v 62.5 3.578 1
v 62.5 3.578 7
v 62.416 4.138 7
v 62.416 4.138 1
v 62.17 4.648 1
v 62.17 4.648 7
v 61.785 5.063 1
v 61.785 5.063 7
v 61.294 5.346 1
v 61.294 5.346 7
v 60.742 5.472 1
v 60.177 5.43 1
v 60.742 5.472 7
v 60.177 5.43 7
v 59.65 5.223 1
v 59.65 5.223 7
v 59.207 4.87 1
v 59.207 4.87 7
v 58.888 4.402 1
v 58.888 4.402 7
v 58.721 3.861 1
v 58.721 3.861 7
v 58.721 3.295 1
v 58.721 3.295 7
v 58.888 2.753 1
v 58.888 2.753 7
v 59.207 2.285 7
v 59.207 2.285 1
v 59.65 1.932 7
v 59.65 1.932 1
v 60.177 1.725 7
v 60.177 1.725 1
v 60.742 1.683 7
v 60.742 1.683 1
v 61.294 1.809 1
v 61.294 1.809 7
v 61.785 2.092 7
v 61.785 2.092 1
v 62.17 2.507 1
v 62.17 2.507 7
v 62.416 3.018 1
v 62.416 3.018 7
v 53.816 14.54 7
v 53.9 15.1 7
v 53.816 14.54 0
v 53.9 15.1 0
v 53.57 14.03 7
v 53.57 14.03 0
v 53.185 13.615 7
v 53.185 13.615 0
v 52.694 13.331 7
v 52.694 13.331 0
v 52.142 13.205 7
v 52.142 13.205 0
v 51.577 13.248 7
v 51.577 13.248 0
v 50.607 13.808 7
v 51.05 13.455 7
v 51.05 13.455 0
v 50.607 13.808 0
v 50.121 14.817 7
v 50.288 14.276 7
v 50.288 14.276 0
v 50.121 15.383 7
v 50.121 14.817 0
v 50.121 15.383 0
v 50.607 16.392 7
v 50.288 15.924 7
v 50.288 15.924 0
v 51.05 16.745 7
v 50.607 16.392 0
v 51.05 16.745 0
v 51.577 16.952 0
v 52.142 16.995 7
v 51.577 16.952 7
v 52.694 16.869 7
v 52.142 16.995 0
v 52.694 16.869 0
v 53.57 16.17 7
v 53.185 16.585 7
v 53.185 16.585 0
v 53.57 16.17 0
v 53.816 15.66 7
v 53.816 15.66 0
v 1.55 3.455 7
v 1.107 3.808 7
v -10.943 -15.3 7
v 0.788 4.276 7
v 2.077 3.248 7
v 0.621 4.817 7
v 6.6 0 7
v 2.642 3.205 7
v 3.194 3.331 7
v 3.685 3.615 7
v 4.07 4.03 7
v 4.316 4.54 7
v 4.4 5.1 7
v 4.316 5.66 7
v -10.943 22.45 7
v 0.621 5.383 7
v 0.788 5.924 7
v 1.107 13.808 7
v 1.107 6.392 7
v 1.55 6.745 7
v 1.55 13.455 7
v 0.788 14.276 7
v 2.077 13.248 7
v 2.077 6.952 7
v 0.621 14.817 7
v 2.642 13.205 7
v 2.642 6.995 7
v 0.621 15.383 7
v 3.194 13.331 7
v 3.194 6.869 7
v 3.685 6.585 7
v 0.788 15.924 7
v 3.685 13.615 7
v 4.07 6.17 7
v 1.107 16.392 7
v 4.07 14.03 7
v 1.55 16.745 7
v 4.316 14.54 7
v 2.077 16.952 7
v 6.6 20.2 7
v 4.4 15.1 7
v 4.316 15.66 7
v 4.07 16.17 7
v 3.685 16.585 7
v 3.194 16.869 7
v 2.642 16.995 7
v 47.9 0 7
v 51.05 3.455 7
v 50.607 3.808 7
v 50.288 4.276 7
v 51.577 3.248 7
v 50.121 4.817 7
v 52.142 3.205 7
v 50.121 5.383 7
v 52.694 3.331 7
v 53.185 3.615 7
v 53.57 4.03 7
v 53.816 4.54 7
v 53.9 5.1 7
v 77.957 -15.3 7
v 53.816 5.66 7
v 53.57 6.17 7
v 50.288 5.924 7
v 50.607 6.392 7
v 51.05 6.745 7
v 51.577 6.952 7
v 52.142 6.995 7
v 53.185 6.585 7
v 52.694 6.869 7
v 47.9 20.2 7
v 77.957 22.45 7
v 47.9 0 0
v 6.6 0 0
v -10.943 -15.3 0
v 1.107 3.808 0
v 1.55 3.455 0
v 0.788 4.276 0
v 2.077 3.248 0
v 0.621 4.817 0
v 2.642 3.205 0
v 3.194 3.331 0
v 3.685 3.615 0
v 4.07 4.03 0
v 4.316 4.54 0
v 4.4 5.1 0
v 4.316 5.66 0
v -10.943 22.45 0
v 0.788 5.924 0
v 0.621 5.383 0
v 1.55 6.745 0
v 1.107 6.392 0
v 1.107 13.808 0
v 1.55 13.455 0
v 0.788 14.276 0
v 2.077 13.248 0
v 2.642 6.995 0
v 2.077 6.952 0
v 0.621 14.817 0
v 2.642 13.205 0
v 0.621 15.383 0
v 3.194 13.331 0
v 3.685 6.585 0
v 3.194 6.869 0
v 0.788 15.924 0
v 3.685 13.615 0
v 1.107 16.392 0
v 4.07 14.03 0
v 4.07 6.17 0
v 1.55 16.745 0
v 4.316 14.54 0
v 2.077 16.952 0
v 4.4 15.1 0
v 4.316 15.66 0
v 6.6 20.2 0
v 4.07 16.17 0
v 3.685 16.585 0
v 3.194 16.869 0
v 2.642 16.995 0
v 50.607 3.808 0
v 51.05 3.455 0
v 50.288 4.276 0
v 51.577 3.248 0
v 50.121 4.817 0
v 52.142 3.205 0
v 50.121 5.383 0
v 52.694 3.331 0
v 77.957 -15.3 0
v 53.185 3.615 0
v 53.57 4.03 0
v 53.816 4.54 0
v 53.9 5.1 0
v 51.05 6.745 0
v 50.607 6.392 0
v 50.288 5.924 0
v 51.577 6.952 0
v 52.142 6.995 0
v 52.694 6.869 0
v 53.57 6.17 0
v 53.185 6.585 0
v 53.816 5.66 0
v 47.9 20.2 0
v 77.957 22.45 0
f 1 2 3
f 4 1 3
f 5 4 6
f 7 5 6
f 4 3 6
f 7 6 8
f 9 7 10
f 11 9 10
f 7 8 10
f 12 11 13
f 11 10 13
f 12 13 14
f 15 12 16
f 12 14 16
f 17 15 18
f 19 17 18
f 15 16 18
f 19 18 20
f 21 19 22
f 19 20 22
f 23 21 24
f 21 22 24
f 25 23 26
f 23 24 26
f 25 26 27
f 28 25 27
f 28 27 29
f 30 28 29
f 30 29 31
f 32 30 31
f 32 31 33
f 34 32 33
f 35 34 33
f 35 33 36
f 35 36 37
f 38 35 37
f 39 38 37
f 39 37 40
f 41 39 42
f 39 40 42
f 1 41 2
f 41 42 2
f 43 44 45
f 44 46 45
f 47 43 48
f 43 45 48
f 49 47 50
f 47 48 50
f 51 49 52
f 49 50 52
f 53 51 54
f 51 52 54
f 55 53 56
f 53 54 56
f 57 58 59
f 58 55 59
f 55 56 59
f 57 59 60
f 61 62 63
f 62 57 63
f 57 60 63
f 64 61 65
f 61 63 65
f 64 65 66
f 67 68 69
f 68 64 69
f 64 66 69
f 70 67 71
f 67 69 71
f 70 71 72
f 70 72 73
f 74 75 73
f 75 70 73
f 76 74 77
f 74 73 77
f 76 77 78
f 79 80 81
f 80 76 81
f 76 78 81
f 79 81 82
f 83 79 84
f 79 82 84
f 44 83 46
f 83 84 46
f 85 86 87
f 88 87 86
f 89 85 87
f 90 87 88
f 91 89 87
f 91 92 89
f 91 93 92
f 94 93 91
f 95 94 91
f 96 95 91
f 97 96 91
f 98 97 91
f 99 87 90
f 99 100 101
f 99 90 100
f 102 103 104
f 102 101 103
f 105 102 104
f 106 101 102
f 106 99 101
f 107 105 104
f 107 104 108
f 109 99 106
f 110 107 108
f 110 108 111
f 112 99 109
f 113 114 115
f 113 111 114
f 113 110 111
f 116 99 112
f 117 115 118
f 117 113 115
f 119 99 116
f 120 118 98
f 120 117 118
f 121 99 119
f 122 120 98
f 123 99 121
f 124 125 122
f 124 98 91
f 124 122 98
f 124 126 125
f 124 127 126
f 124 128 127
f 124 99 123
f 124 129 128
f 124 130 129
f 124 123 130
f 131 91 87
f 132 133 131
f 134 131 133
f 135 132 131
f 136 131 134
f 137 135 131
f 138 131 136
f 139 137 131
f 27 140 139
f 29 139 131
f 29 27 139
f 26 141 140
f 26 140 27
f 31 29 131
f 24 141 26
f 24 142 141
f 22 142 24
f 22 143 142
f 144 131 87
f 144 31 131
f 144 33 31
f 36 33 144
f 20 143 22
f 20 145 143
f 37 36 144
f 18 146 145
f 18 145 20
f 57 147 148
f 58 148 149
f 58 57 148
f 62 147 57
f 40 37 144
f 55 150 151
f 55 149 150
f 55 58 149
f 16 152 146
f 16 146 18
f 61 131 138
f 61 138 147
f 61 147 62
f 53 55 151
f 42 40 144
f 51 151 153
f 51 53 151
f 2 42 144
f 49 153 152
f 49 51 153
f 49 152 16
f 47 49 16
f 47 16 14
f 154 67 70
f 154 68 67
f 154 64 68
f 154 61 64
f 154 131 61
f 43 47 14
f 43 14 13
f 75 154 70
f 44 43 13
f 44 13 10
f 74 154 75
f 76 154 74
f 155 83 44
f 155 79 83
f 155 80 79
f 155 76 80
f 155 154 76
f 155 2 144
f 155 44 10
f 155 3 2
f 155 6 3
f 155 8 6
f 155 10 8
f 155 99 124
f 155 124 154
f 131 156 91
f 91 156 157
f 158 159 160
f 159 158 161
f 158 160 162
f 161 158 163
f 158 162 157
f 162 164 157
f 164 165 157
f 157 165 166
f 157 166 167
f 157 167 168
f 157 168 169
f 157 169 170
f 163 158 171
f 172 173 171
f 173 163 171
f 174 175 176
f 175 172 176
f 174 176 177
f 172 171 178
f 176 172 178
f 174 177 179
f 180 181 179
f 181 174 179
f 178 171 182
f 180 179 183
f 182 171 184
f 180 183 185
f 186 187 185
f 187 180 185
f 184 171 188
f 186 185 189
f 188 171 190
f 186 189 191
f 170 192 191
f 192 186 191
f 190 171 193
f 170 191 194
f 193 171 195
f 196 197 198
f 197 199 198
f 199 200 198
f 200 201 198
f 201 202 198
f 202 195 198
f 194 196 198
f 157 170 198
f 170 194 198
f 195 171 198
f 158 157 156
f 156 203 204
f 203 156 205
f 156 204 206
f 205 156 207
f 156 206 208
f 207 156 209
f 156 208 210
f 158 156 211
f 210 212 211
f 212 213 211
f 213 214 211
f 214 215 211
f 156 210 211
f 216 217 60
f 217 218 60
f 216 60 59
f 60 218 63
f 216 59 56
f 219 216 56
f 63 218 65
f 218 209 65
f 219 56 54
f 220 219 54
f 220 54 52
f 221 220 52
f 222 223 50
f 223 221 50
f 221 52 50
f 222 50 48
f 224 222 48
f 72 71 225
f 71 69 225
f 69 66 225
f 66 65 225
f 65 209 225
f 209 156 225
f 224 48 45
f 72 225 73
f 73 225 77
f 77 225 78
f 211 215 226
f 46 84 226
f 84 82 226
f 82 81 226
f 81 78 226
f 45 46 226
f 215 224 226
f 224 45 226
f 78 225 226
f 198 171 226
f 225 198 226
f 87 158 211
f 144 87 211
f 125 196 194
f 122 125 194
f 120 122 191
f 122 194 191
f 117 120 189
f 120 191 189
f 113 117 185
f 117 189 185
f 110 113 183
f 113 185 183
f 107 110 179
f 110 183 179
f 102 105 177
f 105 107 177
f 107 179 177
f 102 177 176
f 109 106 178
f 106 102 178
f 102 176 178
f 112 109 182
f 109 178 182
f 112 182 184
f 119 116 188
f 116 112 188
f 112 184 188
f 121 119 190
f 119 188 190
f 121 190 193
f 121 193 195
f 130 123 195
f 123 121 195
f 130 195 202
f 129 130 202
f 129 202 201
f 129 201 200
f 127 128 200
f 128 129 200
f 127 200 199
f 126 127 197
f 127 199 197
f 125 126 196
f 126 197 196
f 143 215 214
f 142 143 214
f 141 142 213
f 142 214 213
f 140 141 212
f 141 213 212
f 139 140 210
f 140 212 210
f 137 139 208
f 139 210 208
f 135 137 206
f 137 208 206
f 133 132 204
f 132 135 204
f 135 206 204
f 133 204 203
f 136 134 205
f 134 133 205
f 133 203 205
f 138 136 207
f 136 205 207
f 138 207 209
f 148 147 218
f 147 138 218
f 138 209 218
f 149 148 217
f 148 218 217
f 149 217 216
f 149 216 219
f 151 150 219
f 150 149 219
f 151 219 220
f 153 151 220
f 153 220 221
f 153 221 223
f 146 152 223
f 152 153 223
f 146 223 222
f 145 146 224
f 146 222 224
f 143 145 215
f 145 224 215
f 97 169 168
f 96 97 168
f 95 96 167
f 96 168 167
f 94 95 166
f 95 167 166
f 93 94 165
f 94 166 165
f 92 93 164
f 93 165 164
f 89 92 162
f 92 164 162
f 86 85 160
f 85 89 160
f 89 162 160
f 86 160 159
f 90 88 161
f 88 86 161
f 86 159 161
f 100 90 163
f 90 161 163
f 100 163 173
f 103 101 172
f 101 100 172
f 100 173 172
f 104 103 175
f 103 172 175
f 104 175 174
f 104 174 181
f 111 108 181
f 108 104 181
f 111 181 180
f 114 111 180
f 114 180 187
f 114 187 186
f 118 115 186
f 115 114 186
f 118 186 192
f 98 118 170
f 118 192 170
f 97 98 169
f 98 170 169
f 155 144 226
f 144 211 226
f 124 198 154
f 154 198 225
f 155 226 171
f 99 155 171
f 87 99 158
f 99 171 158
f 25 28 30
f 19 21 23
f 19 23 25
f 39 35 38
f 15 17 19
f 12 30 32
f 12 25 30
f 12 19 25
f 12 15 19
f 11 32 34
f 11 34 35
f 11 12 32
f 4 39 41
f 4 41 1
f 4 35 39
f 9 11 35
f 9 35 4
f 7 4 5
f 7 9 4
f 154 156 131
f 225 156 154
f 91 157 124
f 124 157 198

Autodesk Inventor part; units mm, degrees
ref_plane "YZ Plane" through (0, 0, 0) normal (1, 0, 0) x (0, 1, 0)
ref_plane "XZ Plane" through (0, 0, 0) normal (0, 1, 0) x (-1, 0, 0)
ref_plane "XY Plane" through (0, 0, 0) normal (0, 0, 1) x (1, 0, 0)
sketch "Sketch1" plane through (0, 0, 0) normal (0, 0, 1) x (1, 0, 0)
  line L0 (8.55, 7) -> (8.55, 13.2) construction
  line L1 (8.55, 13.2) -> (8.1046, 13.2) construction
  arc A0 (8.1046, 13.2) -> (8.1046, 7) centre (15.75, 10.1) ccw construction
  line L2 (8.1046, 7) -> (8.55, 7) construction
  line L3 (54.5, 18.2) -> (54.5, 16.6) construction
  line L4 (54.5, 16.6) -> (53.7436, 16.6) construction
  arc A1 (53.7436, 16.6) -> (53.7436, 13.6) centre (52, 15.1) ccw construction
  line L5 (53.7436, 13.6) -> (54.5, 13.6) construction
  line L6 (54.5, 13.6) -> (54.5, 6.6) construction
  line L7 (54.5, 6.6) -> (53.7436, 6.6) construction
  arc A2 (53.7436, 6.6) -> (53.7436, 3.6) centre (52, 5.1) ccw construction
  line L8 (53.7436, 3.6) -> (54.5, 3.6) construction
  line L9 (54.5, 3.6) -> (54.5, 2) construction
  arc A3 (52.5, 0) -> (54.5, 2) centre (52.5, 2) ccw construction
  line L10 (52.5, 0) -> (46.15, 0) construction
  arc A4 (46.15, 0) -> (47.65, 1.5) centre (46.15, 1.5) ccw construction
  line L11 (47.65, 18.7) -> (47.65, 1.5) construction
  arc A5 (47.65, 18.7) -> (46.15, 20.2) centre (46.15, 18.7) ccw construction
  line L12 (8.35, 20.2) -> (46.15, 20.2)
  arc A6 (8.35, 20.2) -> (6.85, 18.7) centre (8.35, 18.7) ccw construction
  line L13 (6.85, 1.5) -> (6.85, 18.7) construction
  arc A7 (6.85, 1.5) -> (8.35, 0) centre (8.35, 1.5) ccw construction
  line L14 (8.35, 0) -> (2, 0) construction
  arc A8 (0, 2) -> (2, 0) centre (2, 2) ccw construction
  line L15 (0, 2) -> (0, 3.6) construction
  line L16 (0, 3.6) -> (0.7564, 3.6) construction
  arc A9 (0.7564, 3.6) -> (0.7564, 6.6) centre (2.5, 5.1) ccw construction
  line L17 (0.7564, 6.6) -> (0, 6.6) construction
  line L18 (0, 6.6) -> (0, 13.6) construction
  line L19 (0, 13.6) -> (0.7564, 13.6) construction
  arc A10 (0.7564, 13.6) -> (0.7564, 16.6) centre (2.5, 15.1) ccw construction
  line L20 (0.7564, 16.6) -> (0, 16.6) construction
  line L21 (0, 16.6) -> (0, 18.2) construction
  arc A11 (2, 20.2) -> (0, 18.2) centre (2, 18.2) ccw construction
  line L22 (2, 20.2) -> (8.35, 20.2)
  arc A12 (54.5, 18.2) -> (52.5, 20.2) centre (52.5, 18.2) ccw construction
  line L23 (46.15, 20.2) -> (52.5, 20.2)
  line L24 (46.15, 0) -> (8.35, 0) construction
  line L25 (54.5, 0) -> (0, 0)
  line L26 (0, 0) -> (0, 20.2) construction
  line L27 (0, 20.2) -> (54.5, 20.2) construction
  line L28 (54.5, 20.2) -> (54.5, 0) construction
  line L29 (54.75, 20.45) -> (-0.25, 20.45)
  line L30 (-0.25, 20.45) -> (-0.25, -0.25)
  line L31 (-0.25, -0.25) -> (54.75, -0.25)
  line L32 (54.75, -0.25) -> (54.75, 20.45)
  line L33 (6.6, -0.25) -> (6.6, 20.45)
  line L34 (47.9, -0.25) -> (47.9, 20.45)
  circle A13 centre (2.5, 5.1) radius 1.9
  circle A14 centre (2.5, 15.1) radius 1.9
  circle A15 centre (52, 5.1) radius 1.9
  circle A16 centre (52, 15.1) radius 1.9
  point P0 (0, 0)
  point P1 (6.6, 20.2)
  point P2 (47.9, 20.2)
  point P3 (47.9, 0)
  point P4 (6.6, 0)
  dimension "d0" = 0
  dimension "d1" = 0
  dimension "d2" = 0.25
  dimension "d3" = 0
  dimension "d4" = 0
  dimension "d5" = 0.25
  dimension "d6" = 0.25
  dimension "d7" = 3.8
  dimension "d8" = 3.8
  dimension "d9" = 3.8
  dimension "d10" = 3.8
extrude "Extrusion1" add sketch "Sketch1" along normal blind 7 contours L22 L33 L29 L34 L23 L12 | L33 L31 L30 L29 | L34 L29 L32 L31 | L25 L34 L31 L33
ref_plane "Work Plane1" through (65.885, 15.7373, 10.7) normal (0, 0, -1) x (0.0023, 1, 0)
sketch "Sketch3" plane through (0, 0, 0) normal (0, 0, -1) x (-1, 0, 0)
  circle A0 centre (-51.2633, 10.1) radius 7.905 construction
  line L0 (10.9433, -15.3) -> (-77.9567, -15.3) construction
  line L1 (10.9433, 35.5) -> (10.9433, -15.3) construction
  line L2 (-77.9567, 35.5) -> (10.9433, 35.5) construction
  line L3 (-77.9567, -15.3) -> (-77.9567, 35.5) construction
  circle A1 centre (-15.75, 10.1) radius 7.905 construction
  line L4 (10.9433, -15.3) -> (-77.9567, -15.3)
  line L5 (-77.9567, -15.3) -> (-77.9567, 20.45)
  line L6 (-77.9567, 20.45) -> (10.9433, 20.45)
  line L7 (10.9433, 20.45) -> (10.9433, -15.3)
  line L8 (-54.75, 20.45) -> (0.25, 20.45) projected
  circle A2 centre (-52, 5.1) radius 1.9 projected
  circle A3 centre (-52, 15.1) radius 1.9 projected
  circle A4 centre (-2.5, 15.1) radius 1.9 projected
  circle A5 centre (-2.5, 5.1) radius 1.9 projected
  line L9 (-6.6, 0) -> (-6.6, 20.2) projected
  line L10 (-6.6, 20.2) -> (-47.9, 20.2) projected
  line L11 (-47.9, 20.2) -> (-47.9, 0) projected
  line L12 (-47.9, 0) -> (-6.6, 0) projected
  line L13 (-54.75, 20.45) -> (0.25, 20.45) projected
  line L14 (0.25, 20.45) -> (0.25, -0.25) projected
  line L15 (0.25, -0.25) -> (-54.75, -0.25) projected
  line L16 (-54.75, -0.25) -> (-54.75, 20.45) projected
  line L17 (10.9433, 20.45) -> (-77.9567, 20.45)
  line L18 (-77.9567, 20.45) -> (-77.9567, 22.45)
  line L19 (-77.9567, 22.45) -> (10.9433, 22.45)
  line L20 (10.9433, 22.45) -> (10.9433, 20.45)
  point P0 (0, 0)
  point P1 (0.25, 20.45)
  dimension "d16" = 0
  dimension "d19" = 2
extrude "Extrusion3" add sketch "Sketch3" against normal up to surface (7 mm away) contours L4 L5 L6 L16 L15 L14 L7 | L6 L18 L19 L20
sketch "Sketch4" plane through (0, 0, 7) normal (0, 0, 1) x (1, 0, 0)
  circle A0 centre (60.6, 3.5778) radius 1.9
  line L0 (-10.9433, 22.45) -> (77.9567, 22.45) construction
  line L1 (77.9567, 22.45) -> (77.9567, -15.3) construction
  line L2 (77.9567, -15.3) -> (-10.9433, -15.3) construction
  line L3 (-10.9433, -15.3) -> (-10.9433, 22.45) construction
  circle A1 centre (52, 5.1) radius 1.9 construction
  circle A2 centre (52, 15.1) radius 1.9 construction
  circle A3 centre (2.5, 15.1) radius 1.9 construction
  circle A4 centre (2.5, 5.1) radius 1.9 construction
  line L4 (6.6, 20.2) -> (6.6, 0) construction
  line L5 (6.6, 0) -> (47.9, 0) construction
  line L6 (47.9, 0) -> (47.9, 20.2) construction
  line L7 (47.9, 20.2) -> (6.6, 20.2) construction
  point P0 (0, 0)
  dimension "d20" = 3.8
  dimension "d21" = 18.8722
  dimension "d23" = 12.7
extrude "Extrusion4" cut sketch "Sketch4" against normal blind 6
properties part number "Top_Claw_Mount"
